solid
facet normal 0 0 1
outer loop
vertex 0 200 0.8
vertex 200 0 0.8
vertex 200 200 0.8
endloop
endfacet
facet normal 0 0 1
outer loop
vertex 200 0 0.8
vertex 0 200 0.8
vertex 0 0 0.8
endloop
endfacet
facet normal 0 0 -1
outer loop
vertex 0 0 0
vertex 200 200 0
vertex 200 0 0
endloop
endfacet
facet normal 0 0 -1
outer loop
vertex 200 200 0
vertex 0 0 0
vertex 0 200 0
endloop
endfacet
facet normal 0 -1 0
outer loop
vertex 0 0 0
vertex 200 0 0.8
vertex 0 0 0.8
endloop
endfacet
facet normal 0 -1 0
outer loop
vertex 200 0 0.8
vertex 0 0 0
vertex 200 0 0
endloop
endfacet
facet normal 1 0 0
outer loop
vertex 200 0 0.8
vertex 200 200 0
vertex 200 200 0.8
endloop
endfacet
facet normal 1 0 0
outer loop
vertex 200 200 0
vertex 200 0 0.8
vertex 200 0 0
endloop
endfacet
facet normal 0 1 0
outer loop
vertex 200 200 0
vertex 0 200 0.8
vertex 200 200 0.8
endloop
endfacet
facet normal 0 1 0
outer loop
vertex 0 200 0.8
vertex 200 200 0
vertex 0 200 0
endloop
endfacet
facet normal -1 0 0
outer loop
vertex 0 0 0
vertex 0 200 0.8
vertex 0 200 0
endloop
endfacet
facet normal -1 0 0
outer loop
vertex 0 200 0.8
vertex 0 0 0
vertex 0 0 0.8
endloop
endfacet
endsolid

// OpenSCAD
// ============================================================================
// 🏰 Main Street Electrical Parade - Pete's Dragon Backlighting Test Panel
// Flat 200mm x 200mm Square Panel | Centered 180mm Dragon
// All colors extend full Z thickness
// ============================================================================

// SELECT THICKNESS HERE (Default: 0.80 mm)
panel_thickness = 0.80; // Options: 1.00, 0.80, 0.60, 0.48

chassis_size = 200.0;
dragon_w = 180.00;
dragon_h = 163.24;
offset_x = 10.00;
offset_y = 18.38;

// Renders the solid monolithic block or imports color STLs
module backlight_panel(t = panel_thickness) {
    cube([chassis_size, chassis_size, t], center = false);
}

backlight_panel(panel_thickness);
